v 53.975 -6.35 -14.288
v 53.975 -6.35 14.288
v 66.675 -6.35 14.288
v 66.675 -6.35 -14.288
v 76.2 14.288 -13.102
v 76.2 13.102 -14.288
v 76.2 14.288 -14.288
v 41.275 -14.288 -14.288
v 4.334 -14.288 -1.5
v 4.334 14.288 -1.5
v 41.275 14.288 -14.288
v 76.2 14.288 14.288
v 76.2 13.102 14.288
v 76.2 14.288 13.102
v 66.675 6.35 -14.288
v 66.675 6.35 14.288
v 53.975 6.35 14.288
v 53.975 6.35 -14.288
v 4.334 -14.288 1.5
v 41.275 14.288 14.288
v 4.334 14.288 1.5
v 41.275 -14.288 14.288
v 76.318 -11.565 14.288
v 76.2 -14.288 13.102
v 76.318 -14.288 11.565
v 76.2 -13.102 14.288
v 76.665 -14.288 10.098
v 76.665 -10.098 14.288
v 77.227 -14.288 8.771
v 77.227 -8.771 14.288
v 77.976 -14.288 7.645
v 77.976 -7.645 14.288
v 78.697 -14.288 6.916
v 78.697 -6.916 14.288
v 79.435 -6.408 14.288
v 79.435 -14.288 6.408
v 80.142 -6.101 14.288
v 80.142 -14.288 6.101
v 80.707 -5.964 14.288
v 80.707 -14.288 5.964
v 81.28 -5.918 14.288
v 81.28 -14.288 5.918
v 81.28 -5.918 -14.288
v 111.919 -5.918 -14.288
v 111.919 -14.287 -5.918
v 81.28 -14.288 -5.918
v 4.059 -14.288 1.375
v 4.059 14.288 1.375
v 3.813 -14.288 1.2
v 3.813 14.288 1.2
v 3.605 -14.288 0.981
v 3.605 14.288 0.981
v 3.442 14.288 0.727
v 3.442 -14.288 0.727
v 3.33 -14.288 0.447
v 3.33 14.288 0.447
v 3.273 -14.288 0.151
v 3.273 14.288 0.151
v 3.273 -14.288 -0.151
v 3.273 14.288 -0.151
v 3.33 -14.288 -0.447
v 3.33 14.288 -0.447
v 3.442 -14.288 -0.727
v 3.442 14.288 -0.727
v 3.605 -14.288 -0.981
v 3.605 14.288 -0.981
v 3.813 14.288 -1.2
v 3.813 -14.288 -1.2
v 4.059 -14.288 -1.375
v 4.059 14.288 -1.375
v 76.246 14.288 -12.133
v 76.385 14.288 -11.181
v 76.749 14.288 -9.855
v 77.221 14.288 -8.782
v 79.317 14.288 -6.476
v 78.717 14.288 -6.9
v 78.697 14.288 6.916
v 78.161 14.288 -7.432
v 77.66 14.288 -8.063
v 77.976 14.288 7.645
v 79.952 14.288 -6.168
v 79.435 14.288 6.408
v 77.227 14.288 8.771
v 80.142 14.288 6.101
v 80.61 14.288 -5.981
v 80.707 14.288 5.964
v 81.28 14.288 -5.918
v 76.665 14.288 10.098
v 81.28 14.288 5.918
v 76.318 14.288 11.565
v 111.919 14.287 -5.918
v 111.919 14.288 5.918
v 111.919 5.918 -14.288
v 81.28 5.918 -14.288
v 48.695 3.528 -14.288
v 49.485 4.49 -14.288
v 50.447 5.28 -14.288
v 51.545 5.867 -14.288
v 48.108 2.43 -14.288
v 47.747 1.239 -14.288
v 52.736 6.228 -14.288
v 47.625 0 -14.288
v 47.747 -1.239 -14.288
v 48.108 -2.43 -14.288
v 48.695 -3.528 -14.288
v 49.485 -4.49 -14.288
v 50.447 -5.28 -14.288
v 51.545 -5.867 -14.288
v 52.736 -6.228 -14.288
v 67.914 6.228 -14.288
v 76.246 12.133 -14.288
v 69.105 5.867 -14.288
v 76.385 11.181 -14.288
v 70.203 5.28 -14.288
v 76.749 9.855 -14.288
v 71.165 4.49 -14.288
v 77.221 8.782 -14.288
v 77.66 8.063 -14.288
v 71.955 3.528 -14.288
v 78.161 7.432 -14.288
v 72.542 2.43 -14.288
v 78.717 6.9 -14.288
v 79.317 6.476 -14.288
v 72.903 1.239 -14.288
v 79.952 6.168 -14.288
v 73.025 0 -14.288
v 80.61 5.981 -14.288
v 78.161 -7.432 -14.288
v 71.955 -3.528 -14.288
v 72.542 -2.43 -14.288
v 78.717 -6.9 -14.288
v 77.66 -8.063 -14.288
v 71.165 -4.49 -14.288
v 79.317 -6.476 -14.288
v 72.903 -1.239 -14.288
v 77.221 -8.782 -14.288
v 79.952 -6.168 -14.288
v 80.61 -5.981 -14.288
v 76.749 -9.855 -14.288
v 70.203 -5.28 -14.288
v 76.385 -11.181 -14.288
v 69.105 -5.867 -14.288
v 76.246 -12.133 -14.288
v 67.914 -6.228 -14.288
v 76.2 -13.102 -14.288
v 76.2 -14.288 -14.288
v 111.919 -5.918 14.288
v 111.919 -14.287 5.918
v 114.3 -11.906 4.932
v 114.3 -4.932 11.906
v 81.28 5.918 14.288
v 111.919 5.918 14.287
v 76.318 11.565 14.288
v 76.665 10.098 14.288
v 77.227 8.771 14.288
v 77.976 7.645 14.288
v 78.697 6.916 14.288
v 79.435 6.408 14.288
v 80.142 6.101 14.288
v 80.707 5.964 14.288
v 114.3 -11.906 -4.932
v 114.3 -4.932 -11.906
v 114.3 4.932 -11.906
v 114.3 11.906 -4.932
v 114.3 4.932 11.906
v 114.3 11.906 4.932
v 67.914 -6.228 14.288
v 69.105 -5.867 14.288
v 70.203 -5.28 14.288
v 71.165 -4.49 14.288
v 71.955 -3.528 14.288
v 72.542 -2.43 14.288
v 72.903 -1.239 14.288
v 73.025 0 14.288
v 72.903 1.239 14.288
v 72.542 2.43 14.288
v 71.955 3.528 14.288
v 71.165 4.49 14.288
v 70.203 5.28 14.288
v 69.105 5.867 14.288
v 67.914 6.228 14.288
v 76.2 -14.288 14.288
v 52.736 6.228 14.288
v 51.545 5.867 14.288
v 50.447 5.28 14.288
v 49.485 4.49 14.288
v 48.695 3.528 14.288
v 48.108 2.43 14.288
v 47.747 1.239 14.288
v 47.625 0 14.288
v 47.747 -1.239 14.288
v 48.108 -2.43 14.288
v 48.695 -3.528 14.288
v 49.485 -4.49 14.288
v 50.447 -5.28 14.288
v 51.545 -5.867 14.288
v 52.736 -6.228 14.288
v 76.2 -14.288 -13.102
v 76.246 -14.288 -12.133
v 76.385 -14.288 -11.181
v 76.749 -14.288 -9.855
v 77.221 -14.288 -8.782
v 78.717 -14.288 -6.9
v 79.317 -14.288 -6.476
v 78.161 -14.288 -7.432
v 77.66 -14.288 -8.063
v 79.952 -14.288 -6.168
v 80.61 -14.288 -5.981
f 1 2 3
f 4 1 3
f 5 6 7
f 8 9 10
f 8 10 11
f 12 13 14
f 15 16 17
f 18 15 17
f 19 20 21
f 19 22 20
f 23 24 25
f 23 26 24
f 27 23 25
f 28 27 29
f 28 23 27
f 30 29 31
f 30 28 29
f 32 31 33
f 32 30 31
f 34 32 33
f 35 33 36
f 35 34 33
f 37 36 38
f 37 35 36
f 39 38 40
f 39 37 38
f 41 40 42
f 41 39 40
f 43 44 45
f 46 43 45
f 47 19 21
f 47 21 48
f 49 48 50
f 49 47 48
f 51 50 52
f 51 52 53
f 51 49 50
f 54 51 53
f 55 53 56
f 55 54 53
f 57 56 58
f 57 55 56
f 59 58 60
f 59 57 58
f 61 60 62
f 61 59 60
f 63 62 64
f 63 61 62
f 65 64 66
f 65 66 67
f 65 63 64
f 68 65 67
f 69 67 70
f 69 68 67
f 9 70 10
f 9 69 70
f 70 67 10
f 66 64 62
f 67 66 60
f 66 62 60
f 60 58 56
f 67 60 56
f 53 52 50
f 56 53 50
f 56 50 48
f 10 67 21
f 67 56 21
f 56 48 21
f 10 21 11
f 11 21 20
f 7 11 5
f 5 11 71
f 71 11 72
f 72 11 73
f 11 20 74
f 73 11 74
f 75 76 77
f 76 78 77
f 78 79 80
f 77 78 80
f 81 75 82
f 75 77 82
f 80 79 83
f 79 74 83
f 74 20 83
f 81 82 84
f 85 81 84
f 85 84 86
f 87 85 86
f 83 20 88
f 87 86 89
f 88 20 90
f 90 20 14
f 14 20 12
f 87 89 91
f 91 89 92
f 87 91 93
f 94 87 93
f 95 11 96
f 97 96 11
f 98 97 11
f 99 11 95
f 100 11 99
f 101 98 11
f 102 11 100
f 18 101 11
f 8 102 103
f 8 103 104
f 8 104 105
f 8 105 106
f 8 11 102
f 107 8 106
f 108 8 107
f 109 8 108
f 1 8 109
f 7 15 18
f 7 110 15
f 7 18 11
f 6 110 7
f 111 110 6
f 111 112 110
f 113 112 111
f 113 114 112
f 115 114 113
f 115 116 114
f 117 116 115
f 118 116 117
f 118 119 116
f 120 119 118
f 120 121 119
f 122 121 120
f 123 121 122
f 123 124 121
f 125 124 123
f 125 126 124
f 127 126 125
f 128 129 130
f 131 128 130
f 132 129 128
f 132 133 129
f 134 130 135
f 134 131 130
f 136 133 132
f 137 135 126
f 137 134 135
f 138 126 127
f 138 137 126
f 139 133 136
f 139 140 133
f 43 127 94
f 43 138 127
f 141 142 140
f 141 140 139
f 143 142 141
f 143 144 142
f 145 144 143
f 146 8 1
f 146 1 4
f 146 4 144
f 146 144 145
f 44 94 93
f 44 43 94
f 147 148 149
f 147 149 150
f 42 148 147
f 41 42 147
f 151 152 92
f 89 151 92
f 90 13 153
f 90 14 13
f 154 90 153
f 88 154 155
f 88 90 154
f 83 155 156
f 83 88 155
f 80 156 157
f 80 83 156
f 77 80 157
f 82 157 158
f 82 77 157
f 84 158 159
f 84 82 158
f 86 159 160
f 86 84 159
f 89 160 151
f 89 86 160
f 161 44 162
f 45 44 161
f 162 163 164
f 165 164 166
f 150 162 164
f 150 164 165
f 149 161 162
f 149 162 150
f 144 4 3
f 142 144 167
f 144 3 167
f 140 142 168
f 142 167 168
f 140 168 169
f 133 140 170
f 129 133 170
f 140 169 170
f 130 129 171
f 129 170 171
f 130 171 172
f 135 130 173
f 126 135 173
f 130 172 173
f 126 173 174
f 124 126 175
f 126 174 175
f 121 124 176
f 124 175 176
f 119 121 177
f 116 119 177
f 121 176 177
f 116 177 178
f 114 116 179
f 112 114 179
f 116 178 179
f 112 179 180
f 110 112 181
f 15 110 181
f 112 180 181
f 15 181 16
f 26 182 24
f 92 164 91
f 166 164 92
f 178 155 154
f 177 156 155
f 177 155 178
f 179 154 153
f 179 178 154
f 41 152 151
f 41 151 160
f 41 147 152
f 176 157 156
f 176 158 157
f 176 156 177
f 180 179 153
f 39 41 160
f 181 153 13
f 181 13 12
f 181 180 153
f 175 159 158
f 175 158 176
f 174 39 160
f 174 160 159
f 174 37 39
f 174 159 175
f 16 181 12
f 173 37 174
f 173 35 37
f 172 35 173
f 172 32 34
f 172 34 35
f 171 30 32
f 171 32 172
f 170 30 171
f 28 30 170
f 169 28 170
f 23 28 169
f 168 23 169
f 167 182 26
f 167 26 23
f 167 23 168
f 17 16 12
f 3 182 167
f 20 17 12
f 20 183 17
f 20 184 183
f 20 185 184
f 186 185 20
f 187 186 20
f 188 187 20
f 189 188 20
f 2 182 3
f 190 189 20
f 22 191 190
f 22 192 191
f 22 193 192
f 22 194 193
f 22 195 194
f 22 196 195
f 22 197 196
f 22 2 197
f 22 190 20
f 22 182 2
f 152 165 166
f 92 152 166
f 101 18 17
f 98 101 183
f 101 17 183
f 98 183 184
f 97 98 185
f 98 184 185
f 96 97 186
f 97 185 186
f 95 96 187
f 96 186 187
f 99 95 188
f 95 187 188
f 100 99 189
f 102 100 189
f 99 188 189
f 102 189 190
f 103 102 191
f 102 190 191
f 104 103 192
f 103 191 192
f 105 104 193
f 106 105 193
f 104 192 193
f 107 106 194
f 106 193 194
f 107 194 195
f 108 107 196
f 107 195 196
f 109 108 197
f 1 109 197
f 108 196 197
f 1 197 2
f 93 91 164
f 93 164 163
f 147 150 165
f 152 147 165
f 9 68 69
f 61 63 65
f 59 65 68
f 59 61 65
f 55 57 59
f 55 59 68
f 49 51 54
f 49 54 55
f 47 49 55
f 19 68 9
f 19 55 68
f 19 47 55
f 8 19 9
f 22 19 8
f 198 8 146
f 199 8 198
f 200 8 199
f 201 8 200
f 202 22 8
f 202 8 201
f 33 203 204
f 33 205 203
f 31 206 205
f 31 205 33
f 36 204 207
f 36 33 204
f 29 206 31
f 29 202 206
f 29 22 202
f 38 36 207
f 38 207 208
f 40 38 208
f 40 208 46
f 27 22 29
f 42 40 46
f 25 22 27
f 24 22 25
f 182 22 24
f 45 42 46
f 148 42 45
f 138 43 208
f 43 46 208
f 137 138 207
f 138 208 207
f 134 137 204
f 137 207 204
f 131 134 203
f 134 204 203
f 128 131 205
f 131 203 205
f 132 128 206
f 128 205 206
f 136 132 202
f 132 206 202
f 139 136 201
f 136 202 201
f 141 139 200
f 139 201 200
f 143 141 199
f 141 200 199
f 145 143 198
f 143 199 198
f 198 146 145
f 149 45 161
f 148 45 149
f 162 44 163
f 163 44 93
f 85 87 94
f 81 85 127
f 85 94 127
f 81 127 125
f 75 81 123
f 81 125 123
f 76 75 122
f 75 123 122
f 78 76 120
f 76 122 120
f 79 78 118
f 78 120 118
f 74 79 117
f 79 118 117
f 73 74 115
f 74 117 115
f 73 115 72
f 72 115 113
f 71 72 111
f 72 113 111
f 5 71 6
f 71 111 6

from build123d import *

# Parameters (mm, degrees)
F1_DEPTH = 14.2875
F3_DEPTH = 28.576
F5_DEPTH = 38.1
F6_R     = 5.08
F7_SIZE  = 2.38125


with BuildPart() as f1:
    # F0 (on Front) → F1 (new body, symmetric)
    with BuildSketch(Plane.XZ):
        with BuildLine():
            Line((76.2, 14.2875), (41.275, 14.2875))
            Line((41.275, 14.2875), (4.333811, 1.500165))
            ThreePointArc((4.333811, 1.500165), (3.265599, 0), (4.333811, -1.500165))
            Line((4.333811, -1.500165), (41.275, -14.2875))
            Line((41.275, -14.2875), (76.2, -14.2875))
            Line((76.2, -14.2875), (114.3, -14.2875))
            Line((114.3, -14.2875), (114.3, 14.2875))
            Line((114.3, 14.2875), (76.2, 14.2875))
        make_face()
    extrude(amount=F1_DEPTH, both=True)

    # F2 (on face) → F3 (cut, through all)
    with BuildSketch(Plane.XY.offset(14.2875)):
        with BuildLine():
            Line((66.675, 6.35), (53.975, 6.35))
            ThreePointArc((53.975, 6.35), (47.625, 0), (53.975, -6.35))
            Line((53.975, -6.35), (66.675, -6.35))
            ThreePointArc((66.675, -6.35), (73.025, 0), (66.675, 6.35))
        make_face()
    extrude(amount=-F3_DEPTH, mode=Mode.SUBTRACT)

    # F4 (on face) → F5 (cut)
    with BuildSketch(Plane.YZ.offset(114.3)):
        Polygon((5.918076, 14.2875), (14.2875, 5.918076), (14.2875, 14.2875), align=None)
        Polygon((-14.2875, 5.918076), (-5.918076, 14.2875), (-14.2875, 14.2875), align=None)
        Polygon((-14.2875, -14.2875), (-5.918076, -14.2875), (-14.2875, -5.918076), align=None)
        Polygon((5.918076, -14.2875), (14.2875, -14.2875), (14.2875, -5.918076), align=None)
    extrude(amount=-F5_DEPTH, mode=Mode.SUBTRACT)

    # F6
    f6_edges = [f1.edges().sort_by_distance(p)[0] for p in [
        (76.2, -10.102788, 10.102788),
        (76.2, -10.102788, -10.102788),
        (76.2, 10.102788, -10.102788),
        (76.2, 10.102788, 10.102788),
    ]]
    fillet(f6_edges, radius=F6_R)

    # F7
    f7_edges = [f1.edges().sort_by_distance(p)[0] for p in [
        (114.3, 10.102788, -10.102788),
        (114.3, 0, -14.2875),
        (114.3, -10.102788, -10.102788),
        (114.3, -14.2875, 0),
        (114.3, -10.102788, 10.102788),
        (114.3, 0, 14.2875),
        (114.3, 10.102788, 10.102788),
        (114.3, 14.2875, 0),
    ]]
    chamfer(f7_edges, length=F7_SIZE)


solid = f1.part
